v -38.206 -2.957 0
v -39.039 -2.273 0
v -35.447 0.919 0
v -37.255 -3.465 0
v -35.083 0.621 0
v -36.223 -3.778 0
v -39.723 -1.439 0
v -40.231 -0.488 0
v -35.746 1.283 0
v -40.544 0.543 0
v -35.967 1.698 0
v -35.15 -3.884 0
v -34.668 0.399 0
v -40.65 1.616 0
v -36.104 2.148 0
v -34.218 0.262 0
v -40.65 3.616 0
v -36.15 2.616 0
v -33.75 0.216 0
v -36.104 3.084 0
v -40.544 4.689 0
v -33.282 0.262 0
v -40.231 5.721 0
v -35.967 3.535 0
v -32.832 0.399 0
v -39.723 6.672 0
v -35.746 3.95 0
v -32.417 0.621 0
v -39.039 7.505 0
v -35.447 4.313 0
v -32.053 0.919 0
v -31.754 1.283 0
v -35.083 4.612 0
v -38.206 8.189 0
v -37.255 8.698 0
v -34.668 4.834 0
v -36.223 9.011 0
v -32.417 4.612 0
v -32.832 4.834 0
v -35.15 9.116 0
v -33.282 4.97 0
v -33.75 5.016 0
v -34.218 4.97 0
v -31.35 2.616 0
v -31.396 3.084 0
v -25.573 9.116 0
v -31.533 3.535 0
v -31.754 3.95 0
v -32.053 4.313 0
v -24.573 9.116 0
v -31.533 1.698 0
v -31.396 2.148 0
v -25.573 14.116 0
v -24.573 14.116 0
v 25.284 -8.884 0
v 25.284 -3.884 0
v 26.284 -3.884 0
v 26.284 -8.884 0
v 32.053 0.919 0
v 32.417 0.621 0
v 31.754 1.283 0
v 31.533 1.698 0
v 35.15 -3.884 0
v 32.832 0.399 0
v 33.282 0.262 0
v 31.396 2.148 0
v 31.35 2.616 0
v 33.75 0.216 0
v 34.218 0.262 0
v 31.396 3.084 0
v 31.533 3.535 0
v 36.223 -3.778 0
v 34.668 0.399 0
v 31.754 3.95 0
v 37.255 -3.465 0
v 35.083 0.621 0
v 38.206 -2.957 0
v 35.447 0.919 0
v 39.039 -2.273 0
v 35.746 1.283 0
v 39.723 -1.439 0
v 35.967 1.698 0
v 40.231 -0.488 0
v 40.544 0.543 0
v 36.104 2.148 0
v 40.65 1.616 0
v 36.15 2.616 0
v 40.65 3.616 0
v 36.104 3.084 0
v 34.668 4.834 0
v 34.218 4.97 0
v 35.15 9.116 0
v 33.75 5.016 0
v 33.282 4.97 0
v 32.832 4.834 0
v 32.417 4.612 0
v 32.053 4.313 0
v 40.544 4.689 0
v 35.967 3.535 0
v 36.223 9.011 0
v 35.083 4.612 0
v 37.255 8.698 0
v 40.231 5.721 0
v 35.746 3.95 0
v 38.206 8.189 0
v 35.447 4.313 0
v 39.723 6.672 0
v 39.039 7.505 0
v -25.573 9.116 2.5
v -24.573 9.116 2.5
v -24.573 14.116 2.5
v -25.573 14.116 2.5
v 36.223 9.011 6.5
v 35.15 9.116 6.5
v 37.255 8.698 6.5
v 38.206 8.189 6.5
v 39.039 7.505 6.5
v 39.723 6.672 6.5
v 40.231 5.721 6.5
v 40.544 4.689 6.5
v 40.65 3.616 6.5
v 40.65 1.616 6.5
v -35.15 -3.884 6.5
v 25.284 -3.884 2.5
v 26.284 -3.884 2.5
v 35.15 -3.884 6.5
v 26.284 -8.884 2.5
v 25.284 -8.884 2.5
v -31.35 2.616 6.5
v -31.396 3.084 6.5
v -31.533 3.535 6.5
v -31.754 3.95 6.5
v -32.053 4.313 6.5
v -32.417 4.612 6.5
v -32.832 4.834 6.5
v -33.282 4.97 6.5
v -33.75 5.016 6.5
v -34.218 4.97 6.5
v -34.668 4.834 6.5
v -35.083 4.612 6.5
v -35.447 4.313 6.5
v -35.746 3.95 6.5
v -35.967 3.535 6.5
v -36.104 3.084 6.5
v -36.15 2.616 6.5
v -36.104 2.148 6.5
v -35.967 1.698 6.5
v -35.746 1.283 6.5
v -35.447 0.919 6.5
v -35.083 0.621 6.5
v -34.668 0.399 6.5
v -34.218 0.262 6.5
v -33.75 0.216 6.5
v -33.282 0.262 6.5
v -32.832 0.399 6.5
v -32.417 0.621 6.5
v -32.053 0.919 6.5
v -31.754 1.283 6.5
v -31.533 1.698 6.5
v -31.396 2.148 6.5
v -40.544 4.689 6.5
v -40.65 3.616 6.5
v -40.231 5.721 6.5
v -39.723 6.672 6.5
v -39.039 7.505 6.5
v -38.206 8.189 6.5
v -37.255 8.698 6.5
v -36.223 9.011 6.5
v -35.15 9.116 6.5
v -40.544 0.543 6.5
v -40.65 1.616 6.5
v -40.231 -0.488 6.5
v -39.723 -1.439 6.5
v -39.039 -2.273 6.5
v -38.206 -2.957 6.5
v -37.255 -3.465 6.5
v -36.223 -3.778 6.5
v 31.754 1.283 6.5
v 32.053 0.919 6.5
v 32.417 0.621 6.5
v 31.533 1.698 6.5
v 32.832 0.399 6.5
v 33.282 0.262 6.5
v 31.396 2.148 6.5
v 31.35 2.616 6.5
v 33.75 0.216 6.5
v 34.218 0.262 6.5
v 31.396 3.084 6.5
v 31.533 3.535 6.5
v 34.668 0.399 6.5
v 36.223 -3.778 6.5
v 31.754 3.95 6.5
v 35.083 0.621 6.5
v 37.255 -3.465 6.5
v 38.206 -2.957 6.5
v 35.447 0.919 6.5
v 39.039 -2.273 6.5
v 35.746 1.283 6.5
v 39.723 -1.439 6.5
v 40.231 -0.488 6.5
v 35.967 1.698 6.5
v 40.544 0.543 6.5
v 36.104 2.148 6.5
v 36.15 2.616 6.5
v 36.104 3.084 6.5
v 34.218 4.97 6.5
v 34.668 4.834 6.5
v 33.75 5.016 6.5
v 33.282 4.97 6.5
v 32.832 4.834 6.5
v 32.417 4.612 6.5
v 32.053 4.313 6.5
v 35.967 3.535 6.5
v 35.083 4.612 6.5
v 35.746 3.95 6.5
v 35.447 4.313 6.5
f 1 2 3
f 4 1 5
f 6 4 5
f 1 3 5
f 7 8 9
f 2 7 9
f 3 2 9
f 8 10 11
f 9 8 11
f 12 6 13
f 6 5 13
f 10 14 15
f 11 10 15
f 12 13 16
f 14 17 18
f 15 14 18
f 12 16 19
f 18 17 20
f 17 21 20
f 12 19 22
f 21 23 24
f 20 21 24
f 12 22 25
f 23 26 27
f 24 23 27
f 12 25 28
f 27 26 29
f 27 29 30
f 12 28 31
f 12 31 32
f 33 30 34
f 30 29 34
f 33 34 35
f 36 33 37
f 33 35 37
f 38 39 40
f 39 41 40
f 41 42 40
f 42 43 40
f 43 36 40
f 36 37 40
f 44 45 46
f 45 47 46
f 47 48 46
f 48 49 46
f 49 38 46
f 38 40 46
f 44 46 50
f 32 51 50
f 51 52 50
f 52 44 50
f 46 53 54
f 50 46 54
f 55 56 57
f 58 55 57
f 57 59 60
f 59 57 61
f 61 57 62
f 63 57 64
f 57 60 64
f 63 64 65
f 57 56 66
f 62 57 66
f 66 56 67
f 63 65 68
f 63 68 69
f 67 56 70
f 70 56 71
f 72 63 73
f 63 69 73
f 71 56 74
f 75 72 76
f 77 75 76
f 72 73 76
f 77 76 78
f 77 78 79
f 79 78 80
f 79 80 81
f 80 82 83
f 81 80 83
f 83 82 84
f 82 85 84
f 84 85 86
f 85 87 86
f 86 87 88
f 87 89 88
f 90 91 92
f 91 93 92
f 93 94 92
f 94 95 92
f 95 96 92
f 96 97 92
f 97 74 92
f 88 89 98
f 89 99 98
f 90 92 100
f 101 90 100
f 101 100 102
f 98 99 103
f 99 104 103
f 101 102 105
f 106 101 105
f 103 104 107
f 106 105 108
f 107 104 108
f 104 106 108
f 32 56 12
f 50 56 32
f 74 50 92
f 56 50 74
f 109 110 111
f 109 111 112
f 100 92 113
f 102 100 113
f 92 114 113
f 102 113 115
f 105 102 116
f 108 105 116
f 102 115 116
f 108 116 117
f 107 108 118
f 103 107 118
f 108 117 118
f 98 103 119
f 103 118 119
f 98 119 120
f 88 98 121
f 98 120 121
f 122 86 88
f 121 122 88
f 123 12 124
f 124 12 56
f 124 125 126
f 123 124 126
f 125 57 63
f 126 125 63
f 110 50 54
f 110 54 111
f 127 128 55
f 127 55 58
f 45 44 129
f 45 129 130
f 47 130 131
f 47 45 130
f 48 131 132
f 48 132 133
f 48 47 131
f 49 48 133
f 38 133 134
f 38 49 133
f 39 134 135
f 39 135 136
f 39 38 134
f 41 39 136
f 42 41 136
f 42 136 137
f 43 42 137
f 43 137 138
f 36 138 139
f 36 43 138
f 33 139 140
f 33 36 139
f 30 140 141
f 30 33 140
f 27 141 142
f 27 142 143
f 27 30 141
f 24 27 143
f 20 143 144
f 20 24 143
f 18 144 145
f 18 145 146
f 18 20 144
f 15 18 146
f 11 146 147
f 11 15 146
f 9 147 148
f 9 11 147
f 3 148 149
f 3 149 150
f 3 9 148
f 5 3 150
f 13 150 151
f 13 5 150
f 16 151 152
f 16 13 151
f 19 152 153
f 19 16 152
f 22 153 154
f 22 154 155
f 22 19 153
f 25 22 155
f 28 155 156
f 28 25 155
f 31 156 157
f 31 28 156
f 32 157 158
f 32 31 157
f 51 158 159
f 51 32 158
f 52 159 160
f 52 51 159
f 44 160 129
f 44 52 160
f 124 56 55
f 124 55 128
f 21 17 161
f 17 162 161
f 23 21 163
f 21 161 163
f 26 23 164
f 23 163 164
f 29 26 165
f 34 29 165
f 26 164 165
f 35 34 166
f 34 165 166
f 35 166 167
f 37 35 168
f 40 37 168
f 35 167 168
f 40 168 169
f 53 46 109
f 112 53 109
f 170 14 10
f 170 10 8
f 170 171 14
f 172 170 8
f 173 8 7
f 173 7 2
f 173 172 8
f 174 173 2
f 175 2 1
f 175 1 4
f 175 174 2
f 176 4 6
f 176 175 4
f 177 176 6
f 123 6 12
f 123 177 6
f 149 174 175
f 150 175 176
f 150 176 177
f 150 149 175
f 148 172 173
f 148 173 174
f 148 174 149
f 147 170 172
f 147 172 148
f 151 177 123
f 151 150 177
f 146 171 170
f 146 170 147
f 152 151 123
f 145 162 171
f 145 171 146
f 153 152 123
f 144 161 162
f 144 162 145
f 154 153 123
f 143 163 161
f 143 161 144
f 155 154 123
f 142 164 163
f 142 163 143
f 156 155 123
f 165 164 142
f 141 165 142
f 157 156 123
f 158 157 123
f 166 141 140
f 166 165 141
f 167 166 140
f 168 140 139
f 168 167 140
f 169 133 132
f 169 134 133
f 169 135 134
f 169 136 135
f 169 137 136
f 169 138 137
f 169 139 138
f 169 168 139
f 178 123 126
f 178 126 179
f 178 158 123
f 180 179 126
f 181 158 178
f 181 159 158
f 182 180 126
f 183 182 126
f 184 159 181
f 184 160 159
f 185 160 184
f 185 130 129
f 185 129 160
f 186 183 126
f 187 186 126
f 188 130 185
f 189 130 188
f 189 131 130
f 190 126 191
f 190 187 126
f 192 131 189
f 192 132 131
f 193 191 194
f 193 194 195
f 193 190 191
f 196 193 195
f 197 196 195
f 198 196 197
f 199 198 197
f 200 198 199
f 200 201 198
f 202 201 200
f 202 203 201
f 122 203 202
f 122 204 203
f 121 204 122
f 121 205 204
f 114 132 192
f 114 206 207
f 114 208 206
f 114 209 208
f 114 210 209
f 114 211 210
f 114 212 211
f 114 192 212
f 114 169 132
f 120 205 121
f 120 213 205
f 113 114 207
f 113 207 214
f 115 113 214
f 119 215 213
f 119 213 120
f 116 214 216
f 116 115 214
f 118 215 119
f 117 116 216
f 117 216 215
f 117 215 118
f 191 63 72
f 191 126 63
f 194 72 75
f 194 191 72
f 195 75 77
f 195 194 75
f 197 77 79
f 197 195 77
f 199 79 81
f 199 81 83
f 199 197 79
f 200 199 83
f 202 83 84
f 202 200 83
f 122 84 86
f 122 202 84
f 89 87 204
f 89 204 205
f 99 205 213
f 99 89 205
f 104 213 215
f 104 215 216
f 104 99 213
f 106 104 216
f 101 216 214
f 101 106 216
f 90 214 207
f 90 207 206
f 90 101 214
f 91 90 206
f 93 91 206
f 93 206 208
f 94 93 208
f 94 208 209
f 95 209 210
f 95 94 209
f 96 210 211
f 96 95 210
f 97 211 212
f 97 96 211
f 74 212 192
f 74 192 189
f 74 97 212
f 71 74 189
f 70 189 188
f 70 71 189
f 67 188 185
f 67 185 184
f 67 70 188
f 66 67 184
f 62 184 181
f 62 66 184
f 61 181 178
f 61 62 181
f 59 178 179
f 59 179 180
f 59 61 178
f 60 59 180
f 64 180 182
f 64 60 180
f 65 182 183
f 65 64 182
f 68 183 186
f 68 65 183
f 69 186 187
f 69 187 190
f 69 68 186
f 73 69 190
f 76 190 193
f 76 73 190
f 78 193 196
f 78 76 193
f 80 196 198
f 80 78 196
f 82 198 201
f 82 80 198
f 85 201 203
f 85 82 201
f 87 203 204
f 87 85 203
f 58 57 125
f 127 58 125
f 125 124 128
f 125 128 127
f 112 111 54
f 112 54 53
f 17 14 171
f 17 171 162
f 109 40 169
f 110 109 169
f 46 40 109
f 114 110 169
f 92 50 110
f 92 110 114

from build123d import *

# Parameters (mm, degrees)
F0_W     = 81.3
F0_H     = 13
F0_R     = 2.4
F1_DEPTH = 6.5
F2_R     = 5.5
F3_W     = 1
F3_H     = 2.5
F4_DEPTH = 5
F5_W     = 1
F5_H     = 2.5
F6_DEPTH = 5


with BuildPart() as f1:
    # F0 (on Top) → F1 (new body)
    with BuildSketch(Plane.XY):
        with Locations((0, 2.616273)):
            Rectangle(F0_W, F0_H)
        with Locations((-33.75, 2.616273)):
            Circle(F0_R, mode=Mode.SUBTRACT)
        with Locations((33.75, 2.616273)):
            Circle(F0_R, mode=Mode.SUBTRACT)
    extrude(amount=F1_DEPTH)

    # F2
    f2_edges = [f1.edges().sort_by_distance(p)[0] for p in [
        (-40.65, 9.116273, 3.25),
        (-40.65, -3.883727, 3.25),
        (40.65, -3.883727, 3.25),
        (40.65, 9.116273, 3.25),
    ]]
    fillet(f2_edges, radius=F2_R)

    # F3 (on face) → F4 (join)
    with BuildSketch(Plane.XZ.offset(3.883727)):
        with Locations((25.7837, 1.25)):
            Rectangle(F3_W, F3_H)
    extrude(amount=F4_DEPTH)

    # F5 (on face) → F6 (join)
    with BuildSketch(Plane(origin=(0, 9.116273, 0), x_dir=(-1, 0, 0), z_dir=(0, 1, 0))):
        with Locations((25.072782, 1.25)):
            Rectangle(F5_W, F5_H)
    extrude(amount=F6_DEPTH)


solid = f1.part
